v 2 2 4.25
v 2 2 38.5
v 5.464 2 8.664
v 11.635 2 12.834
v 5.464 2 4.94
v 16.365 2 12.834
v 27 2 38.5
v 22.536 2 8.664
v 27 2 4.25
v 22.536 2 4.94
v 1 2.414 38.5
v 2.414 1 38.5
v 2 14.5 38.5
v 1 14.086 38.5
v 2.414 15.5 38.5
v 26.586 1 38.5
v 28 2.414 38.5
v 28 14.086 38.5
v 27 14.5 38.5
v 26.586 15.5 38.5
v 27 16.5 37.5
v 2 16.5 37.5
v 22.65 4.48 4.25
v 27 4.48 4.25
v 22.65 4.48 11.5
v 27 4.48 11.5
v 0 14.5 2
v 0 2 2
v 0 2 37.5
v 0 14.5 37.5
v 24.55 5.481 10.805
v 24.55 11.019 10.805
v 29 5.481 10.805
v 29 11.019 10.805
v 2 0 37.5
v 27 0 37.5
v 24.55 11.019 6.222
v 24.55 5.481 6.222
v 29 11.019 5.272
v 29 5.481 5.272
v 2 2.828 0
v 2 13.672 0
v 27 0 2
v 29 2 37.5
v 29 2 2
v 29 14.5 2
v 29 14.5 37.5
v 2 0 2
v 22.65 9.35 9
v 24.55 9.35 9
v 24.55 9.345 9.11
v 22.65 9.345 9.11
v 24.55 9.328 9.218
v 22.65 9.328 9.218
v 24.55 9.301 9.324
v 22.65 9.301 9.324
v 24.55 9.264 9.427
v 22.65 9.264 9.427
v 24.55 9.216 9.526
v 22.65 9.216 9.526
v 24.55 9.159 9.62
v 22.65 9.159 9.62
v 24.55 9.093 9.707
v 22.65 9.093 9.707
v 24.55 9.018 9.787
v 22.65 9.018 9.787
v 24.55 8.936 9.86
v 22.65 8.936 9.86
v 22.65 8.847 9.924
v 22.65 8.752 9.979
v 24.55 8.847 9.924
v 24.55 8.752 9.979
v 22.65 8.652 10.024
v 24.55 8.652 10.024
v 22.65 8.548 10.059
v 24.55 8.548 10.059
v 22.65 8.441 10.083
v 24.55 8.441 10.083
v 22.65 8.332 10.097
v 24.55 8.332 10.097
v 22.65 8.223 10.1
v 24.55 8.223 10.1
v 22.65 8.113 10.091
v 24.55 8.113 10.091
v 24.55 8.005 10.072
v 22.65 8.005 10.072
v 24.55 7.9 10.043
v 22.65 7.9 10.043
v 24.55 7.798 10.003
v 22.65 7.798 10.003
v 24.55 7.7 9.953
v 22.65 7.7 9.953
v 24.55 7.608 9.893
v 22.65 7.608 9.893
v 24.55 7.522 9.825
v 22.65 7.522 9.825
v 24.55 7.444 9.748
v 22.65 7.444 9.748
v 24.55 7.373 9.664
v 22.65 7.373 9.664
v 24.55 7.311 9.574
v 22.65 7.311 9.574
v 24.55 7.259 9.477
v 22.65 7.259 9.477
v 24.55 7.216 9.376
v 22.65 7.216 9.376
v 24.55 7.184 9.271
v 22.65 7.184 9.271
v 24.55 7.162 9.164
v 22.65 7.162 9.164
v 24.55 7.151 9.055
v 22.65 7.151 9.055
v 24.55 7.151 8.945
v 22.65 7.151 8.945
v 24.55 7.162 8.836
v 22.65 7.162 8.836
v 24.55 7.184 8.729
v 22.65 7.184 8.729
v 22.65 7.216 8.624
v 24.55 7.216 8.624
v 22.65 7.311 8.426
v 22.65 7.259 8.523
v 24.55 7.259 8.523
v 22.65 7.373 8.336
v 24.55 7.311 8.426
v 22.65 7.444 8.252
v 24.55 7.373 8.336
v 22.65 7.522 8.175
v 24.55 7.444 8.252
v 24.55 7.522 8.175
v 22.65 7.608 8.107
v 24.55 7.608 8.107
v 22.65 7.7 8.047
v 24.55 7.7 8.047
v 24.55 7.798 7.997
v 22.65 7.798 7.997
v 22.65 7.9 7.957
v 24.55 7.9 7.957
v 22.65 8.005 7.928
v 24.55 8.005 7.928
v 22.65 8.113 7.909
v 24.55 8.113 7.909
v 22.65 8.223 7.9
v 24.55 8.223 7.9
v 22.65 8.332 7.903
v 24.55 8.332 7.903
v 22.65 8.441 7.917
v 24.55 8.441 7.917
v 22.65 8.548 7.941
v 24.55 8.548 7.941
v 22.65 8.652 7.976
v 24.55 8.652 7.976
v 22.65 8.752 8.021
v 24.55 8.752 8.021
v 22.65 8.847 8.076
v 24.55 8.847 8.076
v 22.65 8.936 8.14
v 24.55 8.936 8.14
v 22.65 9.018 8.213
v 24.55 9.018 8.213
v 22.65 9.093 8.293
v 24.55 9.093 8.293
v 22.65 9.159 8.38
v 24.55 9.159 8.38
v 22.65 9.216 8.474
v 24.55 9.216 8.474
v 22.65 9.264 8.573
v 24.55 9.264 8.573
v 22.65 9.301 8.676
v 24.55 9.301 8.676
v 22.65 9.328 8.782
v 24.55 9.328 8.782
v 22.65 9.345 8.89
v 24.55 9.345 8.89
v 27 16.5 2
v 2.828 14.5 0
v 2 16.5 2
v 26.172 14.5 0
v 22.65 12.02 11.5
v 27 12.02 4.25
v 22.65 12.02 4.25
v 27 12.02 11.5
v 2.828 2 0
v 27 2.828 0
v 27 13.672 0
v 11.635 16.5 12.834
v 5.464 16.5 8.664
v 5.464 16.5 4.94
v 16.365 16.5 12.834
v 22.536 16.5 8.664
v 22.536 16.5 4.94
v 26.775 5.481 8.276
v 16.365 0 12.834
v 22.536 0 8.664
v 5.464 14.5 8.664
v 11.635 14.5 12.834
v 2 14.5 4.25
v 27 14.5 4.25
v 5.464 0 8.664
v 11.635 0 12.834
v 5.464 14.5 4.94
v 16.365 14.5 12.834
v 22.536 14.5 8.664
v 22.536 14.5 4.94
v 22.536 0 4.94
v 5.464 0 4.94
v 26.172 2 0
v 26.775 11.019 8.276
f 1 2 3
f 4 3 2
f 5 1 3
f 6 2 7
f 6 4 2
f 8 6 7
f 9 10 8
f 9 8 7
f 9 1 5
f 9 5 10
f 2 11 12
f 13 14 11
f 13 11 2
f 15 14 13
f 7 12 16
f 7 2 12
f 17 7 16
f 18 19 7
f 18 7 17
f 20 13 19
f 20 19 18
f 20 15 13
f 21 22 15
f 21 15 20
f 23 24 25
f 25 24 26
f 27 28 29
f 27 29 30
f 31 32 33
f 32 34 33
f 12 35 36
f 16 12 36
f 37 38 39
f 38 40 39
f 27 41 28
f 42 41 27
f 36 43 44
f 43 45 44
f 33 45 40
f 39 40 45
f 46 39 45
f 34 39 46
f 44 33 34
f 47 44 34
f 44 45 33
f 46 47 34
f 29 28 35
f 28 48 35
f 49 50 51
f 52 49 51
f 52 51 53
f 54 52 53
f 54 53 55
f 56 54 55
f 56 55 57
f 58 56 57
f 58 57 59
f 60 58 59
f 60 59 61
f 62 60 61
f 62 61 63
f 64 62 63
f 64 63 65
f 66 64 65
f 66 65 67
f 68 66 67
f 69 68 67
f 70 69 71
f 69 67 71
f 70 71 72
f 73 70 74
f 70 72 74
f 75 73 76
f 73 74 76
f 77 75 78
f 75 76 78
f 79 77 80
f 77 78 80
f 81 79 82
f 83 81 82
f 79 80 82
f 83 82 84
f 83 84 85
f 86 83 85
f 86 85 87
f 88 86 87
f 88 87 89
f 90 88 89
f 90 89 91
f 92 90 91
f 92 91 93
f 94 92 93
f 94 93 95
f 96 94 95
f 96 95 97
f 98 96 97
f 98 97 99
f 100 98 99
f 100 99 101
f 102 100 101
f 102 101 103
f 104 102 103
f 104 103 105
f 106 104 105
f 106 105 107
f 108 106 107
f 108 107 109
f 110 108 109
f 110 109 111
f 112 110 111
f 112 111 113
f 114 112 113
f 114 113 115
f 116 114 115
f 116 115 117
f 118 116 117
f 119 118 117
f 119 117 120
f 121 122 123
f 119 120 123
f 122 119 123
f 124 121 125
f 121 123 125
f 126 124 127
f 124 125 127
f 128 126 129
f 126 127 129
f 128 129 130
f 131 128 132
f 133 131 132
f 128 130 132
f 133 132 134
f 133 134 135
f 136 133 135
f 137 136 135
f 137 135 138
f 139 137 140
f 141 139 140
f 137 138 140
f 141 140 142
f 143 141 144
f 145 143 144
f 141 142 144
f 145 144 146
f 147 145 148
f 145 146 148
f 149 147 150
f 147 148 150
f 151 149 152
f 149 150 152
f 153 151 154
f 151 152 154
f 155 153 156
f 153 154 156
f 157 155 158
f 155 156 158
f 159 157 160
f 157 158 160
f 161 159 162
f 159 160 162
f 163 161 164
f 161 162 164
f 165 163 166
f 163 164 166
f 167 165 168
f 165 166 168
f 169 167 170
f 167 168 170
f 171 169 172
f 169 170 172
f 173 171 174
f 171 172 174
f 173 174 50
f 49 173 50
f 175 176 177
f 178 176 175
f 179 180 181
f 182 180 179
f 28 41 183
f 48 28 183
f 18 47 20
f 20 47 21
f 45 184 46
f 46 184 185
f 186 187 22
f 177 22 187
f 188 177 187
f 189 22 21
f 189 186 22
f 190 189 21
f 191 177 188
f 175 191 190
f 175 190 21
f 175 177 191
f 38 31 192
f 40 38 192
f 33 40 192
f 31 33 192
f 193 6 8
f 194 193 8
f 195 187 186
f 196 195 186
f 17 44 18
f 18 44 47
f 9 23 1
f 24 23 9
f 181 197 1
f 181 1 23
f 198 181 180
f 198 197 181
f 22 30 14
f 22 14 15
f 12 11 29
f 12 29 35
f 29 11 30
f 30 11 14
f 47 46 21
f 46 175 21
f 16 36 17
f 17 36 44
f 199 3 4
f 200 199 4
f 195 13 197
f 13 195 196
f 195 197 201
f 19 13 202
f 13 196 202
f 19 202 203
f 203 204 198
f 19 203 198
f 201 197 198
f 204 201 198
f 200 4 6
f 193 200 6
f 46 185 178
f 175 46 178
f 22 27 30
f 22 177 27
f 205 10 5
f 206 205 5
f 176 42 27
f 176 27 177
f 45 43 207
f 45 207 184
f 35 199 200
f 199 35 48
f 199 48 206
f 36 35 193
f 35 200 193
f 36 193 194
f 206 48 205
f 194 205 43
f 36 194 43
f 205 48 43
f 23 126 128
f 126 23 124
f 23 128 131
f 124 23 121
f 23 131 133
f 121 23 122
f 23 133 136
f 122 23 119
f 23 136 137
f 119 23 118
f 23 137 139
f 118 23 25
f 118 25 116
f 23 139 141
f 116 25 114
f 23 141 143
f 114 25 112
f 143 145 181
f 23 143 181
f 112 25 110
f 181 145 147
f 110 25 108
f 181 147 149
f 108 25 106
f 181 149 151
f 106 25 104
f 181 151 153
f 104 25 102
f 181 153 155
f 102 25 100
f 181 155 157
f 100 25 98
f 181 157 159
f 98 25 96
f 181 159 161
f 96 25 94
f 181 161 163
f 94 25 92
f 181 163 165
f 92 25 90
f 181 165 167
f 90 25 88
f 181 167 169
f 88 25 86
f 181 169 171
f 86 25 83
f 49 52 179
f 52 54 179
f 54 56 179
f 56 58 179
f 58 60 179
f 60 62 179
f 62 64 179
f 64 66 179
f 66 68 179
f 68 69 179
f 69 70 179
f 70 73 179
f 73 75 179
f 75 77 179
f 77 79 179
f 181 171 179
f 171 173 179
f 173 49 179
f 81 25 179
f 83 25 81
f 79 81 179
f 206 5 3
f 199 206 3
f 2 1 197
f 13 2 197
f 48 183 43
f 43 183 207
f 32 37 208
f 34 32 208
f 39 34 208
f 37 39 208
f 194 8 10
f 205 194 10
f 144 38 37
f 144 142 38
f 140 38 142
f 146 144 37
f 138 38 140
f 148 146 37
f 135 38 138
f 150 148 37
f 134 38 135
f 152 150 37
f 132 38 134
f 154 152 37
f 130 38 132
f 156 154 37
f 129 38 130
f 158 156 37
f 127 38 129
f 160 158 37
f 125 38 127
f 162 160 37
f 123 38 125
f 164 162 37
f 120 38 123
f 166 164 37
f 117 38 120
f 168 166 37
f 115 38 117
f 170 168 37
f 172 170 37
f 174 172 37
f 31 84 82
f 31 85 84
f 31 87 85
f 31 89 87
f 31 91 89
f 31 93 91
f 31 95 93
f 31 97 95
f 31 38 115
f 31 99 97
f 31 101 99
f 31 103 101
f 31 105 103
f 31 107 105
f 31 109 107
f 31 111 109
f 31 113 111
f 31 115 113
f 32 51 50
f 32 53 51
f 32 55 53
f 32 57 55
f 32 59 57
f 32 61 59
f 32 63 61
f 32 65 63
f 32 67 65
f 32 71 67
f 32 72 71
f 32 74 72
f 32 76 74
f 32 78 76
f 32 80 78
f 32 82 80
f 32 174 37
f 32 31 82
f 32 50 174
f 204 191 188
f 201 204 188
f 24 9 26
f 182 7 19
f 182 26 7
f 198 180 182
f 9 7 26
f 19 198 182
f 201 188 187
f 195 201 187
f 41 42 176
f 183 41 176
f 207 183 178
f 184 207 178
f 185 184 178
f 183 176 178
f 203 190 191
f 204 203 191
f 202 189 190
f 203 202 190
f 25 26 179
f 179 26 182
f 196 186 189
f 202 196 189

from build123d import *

# Parameters (mm, degrees)
F0_W      = 29
F0_H      = 16.5
F1_DEPTH  = 38.5
F2_T      = -2
F3_DEPTH  = 2.25
F4_SIZE   = 2
F5_SIZE   = 2
F6_SIZE   = 1
F8_DEPTH  = 16.501
F9_W      = 7.54
F9_H      = 7.25
F9_R      = 1.1
F10_DEPTH = 6.35
F13_W     = 5.538
F13_H     = 4.583
F11_W     = 5.538
F11_H     = 5.533


with BuildPart() as f1:
    # F0 (on Top) → F1 (new body)
    with BuildSketch(Plane.XY):
        with Locations((14.5, 8.25)):
            Rectangle(F0_W, F0_H)
    extrude(amount=F1_DEPTH)

    # F2
    f2_openings = [f1.faces().sort_by_distance(p)[0] for p in [
        (14.5, 8.25, 38.5),
    ]]
    offset(amount=F2_T, openings=f2_openings)

    # F3 (add): a face of the model
    f3_faces = [f1.faces().sort_by_distance(p)[0] for p in [
        (14.5, 8.25, 2),
    ]]
    extrude(f3_faces, amount=F3_DEPTH)

    # F4
    f4_edges = [f1.edges().sort_by_distance(p)[0] for p in [
        (29, 0, 19.25),
        (29, 16.5, 19.25),
        (0, 0, 19.25),
        (0, 16.5, 19.25),
    ]]
    chamfer(f4_edges, length=F4_SIZE)

    # F5
    f5_edges = [f1.edges().sort_by_distance(p)[0] for p in [
        (14.5, 0, 0),
        (28, 1, 0),
        (29, 8.25, 0),
        (28, 15.5, 0),
        (14.5, 16.5, 0),
        (1, 15.5, 0),
        (0, 8.25, 0),
        (1, 1, 0),
    ]]
    chamfer(f5_edges, length=F5_SIZE)

    # F6
    f6_edges = [f1.edges().sort_by_distance(p)[0] for p in [
        (0, 8.25, 38.5),
        (1, 1, 38.5),
        (14.5, 0, 38.5),
        (28, 1, 38.5),
        (29, 8.25, 38.5),
        (28, 15.5, 38.5),
        (14.5, 16.5, 38.5),
        (1, 15.5, 38.5),
    ]]
    chamfer(f6_edges, length=F6_SIZE)

    # F7 (on face) → F8 (cut, through all)
    with BuildSketch(Plane(origin=(0, 16.5, 0), x_dir=(-1, 0, 0), z_dir=(0, 1, 0))):
        Polygon((-22.536, 8.664), (-22.536, 4.94), (-5.464, 4.94), (-5.464, 8.664), (-11.635, 12.834), (-16.365, 12.834), align=None)
    extrude(amount=-F8_DEPTH, mode=Mode.SUBTRACT)

    # F9 (on face) → F10 (join)
    with BuildSketch(Plane.YZ.offset(29)):
        with Locations((8.25, 7.875)):
            Rectangle(F9_W, F9_H)
        with Locations((8.25, 9)):
            Circle(F9_R, mode=Mode.SUBTRACT)
    extrude(amount=-F10_DEPTH)

    # F13 (on offset) → F14 section 0
    with BuildSketch(Plane.YZ.offset(24.55)):
        with Locations((8.25, 8.5135)):
            Rectangle(F13_W, F13_H)
    # F11 (on face) → F14 section 1
    with BuildSketch(Plane.YZ.offset(29)):
        with Locations((8.25, 8.0385)):
            Rectangle(F11_W, F11_H)
    loft(mode=Mode.SUBTRACT)


solid = f1.part
